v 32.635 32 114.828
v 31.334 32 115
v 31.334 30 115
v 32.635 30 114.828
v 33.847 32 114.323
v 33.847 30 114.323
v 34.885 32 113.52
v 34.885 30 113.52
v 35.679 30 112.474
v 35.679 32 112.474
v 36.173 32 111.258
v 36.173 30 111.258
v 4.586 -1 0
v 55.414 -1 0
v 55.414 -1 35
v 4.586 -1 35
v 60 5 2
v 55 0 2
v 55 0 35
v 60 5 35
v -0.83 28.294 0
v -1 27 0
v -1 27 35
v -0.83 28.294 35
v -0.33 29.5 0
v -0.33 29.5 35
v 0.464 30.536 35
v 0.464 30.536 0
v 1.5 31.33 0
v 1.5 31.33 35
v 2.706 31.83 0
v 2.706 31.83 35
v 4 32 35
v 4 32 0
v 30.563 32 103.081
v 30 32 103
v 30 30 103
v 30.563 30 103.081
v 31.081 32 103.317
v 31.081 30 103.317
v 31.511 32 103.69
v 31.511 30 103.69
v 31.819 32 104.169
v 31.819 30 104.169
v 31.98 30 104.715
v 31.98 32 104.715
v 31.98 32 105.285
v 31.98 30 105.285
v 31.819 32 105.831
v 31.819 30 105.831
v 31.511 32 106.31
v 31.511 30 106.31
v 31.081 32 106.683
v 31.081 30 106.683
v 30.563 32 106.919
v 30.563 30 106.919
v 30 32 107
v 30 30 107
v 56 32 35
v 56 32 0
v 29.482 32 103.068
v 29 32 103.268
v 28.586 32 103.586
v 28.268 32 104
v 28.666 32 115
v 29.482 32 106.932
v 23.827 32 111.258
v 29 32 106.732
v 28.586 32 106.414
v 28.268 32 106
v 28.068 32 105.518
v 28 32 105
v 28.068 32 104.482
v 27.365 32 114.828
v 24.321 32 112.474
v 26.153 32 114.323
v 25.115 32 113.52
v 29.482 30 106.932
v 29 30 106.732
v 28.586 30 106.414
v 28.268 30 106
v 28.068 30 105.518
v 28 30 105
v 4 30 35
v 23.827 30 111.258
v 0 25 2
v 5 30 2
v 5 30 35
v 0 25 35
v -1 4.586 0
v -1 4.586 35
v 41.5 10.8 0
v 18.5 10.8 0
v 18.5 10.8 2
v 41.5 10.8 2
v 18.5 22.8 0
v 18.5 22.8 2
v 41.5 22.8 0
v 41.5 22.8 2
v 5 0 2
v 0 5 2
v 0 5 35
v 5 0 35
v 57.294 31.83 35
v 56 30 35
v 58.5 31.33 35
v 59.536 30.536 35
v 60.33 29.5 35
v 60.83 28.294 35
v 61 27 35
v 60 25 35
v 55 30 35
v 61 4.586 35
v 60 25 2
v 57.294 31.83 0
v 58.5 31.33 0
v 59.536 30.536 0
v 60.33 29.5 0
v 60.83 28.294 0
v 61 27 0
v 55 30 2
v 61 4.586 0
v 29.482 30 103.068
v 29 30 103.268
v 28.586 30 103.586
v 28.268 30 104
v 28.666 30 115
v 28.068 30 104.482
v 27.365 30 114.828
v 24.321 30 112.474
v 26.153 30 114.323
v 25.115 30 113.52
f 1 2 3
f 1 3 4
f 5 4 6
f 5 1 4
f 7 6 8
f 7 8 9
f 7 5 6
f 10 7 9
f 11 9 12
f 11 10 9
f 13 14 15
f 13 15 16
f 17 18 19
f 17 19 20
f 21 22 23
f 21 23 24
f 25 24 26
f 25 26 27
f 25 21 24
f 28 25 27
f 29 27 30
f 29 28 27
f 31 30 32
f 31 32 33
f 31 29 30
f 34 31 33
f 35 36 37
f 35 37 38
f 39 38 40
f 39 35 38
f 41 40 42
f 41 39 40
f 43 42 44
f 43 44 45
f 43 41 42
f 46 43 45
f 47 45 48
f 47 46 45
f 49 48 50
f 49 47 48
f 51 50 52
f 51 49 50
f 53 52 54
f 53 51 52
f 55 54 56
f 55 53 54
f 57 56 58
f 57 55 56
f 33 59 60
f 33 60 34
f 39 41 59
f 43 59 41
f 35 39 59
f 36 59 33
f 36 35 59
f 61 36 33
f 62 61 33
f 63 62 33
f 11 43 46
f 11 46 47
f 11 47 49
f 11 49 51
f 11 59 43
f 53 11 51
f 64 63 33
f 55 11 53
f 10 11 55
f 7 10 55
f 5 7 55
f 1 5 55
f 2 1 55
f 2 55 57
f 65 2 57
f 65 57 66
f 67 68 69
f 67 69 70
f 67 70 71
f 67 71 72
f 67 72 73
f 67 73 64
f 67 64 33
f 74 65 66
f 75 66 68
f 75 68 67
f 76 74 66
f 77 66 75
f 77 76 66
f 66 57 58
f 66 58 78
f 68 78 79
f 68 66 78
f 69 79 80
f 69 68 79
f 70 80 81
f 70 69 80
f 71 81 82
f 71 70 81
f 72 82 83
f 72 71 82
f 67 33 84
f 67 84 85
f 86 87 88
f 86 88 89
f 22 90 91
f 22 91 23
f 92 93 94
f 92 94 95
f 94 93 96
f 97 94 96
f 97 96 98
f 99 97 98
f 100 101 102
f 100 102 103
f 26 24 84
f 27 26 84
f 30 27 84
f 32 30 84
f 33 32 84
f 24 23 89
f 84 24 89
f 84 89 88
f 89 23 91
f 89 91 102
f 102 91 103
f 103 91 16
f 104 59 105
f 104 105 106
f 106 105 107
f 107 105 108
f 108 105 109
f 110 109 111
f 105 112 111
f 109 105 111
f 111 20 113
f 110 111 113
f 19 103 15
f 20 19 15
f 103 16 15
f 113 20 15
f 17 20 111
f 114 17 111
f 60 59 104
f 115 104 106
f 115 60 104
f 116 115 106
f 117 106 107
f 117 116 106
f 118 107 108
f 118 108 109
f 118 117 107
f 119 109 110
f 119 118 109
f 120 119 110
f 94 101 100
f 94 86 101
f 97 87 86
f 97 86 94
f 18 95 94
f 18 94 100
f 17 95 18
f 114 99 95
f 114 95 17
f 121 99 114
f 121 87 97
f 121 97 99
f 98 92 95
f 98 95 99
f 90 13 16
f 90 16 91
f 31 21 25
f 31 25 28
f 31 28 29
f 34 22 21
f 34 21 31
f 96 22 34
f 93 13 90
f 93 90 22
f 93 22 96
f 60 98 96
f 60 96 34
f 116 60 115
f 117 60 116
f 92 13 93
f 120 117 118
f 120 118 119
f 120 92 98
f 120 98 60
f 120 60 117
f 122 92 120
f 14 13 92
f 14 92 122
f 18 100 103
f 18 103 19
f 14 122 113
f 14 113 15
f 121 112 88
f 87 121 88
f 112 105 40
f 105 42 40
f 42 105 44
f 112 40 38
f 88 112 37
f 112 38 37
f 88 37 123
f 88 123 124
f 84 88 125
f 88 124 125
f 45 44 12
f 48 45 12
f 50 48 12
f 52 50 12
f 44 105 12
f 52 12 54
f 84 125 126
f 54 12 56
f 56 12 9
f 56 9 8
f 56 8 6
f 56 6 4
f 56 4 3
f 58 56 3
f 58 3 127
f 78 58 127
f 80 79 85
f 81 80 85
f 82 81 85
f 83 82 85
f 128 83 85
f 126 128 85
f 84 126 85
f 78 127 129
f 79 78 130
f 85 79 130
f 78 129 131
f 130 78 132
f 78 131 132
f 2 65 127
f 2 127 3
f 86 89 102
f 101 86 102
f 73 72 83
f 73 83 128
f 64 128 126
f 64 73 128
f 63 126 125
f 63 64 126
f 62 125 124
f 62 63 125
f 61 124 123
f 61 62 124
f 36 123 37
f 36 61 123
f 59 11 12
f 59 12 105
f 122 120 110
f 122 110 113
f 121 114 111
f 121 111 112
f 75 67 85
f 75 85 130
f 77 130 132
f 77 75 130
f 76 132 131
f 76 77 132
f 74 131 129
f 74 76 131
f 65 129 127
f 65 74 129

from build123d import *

# Parameters (mm, degrees)
F0_W     = 23
F0_H     = 12
F1_DEPTH = 2
F3_DEPTH = 35
F5_DEPTH = 2


with BuildPart() as f1:
    # F0 (on Top) → F1 (new body)
    with BuildSketch(Plane.XY):
        Polygon((0, 5), (5, 0), (55, 0), (60, 5), (60, 25), (55, 30), (5, 30), (0, 25), align=None)
        with Locations((30, 16.8)):
            Rectangle(F0_W, F0_H, mode=Mode.SUBTRACT)
    extrude(amount=F1_DEPTH)

    # F2 (on face) → F3 (join)
    with BuildSketch(Plane(origin=(0, 0, 0), x_dir=(1, 0, 0), z_dir=(0, 0, -1))):
        with BuildLine():
            Line((61, -27), (61, -4.585786))
            Line((61, -4.585786), (55.414214, 1))
            Line((55.414214, 1), (4.585786, 1))
            Line((4.585786, 1), (-1, -4.585786))
            Line((-1, -4.585786), (-1, -27))
            ThreePointArc((-1, -27), (0.464466, -30.535534), (4, -32))
            Line((4, -32), (56, -32))
            ThreePointArc((56, -32), (59.535534, -30.535534), (61, -27))
        make_face()
        Polygon((5, -30), (0, -25), (0, -5), (5, 0), (55, 0), (60, -5), (60, -25), (55, -30), align=None, mode=Mode.SUBTRACT)
    extrude(amount=-F3_DEPTH)

    # F4 (on face) → F5 (join)
    with BuildSketch(Plane(origin=(0, 32, 0), x_dir=(-1, 0, 0), z_dir=(0, 1, 0))):
        with BuildLine():
            Line((-56, 35), (-30, 35))
            Line((-30, 35), (-30, 103))
            ThreePointArc((-30, 103), (-32, 105), (-30, 107))
            Line((-30, 107), (-30, 115))
            Line((-30, 115), (-31.333763, 115))
            ThreePointArc((-31.333763, 115), (-34.392289, 113.95543), (-36.172876, 111.258169))
            Line((-36.172876, 111.258169), (-56, 35))
        make_face()
        with BuildLine():
            Line((-30, 103), (-30, 35))
            Line((-30, 35), (-4, 35))
            Line((-4, 35), (-23.827124, 111.258169))
            ThreePointArc((-23.827124, 111.258169), (-25.607711, 113.95543), (-28.666237, 115))
            Line((-28.666237, 115), (-30, 115))
            Line((-30, 115), (-30, 107))
            ThreePointArc((-30, 107), (-28.585786, 106.414214), (-28, 105))
            ThreePointArc((-28, 105), (-28.585786, 103.585786), (-30, 103))
        make_face()
    extrude(amount=-F5_DEPTH)


solid = f1.part
